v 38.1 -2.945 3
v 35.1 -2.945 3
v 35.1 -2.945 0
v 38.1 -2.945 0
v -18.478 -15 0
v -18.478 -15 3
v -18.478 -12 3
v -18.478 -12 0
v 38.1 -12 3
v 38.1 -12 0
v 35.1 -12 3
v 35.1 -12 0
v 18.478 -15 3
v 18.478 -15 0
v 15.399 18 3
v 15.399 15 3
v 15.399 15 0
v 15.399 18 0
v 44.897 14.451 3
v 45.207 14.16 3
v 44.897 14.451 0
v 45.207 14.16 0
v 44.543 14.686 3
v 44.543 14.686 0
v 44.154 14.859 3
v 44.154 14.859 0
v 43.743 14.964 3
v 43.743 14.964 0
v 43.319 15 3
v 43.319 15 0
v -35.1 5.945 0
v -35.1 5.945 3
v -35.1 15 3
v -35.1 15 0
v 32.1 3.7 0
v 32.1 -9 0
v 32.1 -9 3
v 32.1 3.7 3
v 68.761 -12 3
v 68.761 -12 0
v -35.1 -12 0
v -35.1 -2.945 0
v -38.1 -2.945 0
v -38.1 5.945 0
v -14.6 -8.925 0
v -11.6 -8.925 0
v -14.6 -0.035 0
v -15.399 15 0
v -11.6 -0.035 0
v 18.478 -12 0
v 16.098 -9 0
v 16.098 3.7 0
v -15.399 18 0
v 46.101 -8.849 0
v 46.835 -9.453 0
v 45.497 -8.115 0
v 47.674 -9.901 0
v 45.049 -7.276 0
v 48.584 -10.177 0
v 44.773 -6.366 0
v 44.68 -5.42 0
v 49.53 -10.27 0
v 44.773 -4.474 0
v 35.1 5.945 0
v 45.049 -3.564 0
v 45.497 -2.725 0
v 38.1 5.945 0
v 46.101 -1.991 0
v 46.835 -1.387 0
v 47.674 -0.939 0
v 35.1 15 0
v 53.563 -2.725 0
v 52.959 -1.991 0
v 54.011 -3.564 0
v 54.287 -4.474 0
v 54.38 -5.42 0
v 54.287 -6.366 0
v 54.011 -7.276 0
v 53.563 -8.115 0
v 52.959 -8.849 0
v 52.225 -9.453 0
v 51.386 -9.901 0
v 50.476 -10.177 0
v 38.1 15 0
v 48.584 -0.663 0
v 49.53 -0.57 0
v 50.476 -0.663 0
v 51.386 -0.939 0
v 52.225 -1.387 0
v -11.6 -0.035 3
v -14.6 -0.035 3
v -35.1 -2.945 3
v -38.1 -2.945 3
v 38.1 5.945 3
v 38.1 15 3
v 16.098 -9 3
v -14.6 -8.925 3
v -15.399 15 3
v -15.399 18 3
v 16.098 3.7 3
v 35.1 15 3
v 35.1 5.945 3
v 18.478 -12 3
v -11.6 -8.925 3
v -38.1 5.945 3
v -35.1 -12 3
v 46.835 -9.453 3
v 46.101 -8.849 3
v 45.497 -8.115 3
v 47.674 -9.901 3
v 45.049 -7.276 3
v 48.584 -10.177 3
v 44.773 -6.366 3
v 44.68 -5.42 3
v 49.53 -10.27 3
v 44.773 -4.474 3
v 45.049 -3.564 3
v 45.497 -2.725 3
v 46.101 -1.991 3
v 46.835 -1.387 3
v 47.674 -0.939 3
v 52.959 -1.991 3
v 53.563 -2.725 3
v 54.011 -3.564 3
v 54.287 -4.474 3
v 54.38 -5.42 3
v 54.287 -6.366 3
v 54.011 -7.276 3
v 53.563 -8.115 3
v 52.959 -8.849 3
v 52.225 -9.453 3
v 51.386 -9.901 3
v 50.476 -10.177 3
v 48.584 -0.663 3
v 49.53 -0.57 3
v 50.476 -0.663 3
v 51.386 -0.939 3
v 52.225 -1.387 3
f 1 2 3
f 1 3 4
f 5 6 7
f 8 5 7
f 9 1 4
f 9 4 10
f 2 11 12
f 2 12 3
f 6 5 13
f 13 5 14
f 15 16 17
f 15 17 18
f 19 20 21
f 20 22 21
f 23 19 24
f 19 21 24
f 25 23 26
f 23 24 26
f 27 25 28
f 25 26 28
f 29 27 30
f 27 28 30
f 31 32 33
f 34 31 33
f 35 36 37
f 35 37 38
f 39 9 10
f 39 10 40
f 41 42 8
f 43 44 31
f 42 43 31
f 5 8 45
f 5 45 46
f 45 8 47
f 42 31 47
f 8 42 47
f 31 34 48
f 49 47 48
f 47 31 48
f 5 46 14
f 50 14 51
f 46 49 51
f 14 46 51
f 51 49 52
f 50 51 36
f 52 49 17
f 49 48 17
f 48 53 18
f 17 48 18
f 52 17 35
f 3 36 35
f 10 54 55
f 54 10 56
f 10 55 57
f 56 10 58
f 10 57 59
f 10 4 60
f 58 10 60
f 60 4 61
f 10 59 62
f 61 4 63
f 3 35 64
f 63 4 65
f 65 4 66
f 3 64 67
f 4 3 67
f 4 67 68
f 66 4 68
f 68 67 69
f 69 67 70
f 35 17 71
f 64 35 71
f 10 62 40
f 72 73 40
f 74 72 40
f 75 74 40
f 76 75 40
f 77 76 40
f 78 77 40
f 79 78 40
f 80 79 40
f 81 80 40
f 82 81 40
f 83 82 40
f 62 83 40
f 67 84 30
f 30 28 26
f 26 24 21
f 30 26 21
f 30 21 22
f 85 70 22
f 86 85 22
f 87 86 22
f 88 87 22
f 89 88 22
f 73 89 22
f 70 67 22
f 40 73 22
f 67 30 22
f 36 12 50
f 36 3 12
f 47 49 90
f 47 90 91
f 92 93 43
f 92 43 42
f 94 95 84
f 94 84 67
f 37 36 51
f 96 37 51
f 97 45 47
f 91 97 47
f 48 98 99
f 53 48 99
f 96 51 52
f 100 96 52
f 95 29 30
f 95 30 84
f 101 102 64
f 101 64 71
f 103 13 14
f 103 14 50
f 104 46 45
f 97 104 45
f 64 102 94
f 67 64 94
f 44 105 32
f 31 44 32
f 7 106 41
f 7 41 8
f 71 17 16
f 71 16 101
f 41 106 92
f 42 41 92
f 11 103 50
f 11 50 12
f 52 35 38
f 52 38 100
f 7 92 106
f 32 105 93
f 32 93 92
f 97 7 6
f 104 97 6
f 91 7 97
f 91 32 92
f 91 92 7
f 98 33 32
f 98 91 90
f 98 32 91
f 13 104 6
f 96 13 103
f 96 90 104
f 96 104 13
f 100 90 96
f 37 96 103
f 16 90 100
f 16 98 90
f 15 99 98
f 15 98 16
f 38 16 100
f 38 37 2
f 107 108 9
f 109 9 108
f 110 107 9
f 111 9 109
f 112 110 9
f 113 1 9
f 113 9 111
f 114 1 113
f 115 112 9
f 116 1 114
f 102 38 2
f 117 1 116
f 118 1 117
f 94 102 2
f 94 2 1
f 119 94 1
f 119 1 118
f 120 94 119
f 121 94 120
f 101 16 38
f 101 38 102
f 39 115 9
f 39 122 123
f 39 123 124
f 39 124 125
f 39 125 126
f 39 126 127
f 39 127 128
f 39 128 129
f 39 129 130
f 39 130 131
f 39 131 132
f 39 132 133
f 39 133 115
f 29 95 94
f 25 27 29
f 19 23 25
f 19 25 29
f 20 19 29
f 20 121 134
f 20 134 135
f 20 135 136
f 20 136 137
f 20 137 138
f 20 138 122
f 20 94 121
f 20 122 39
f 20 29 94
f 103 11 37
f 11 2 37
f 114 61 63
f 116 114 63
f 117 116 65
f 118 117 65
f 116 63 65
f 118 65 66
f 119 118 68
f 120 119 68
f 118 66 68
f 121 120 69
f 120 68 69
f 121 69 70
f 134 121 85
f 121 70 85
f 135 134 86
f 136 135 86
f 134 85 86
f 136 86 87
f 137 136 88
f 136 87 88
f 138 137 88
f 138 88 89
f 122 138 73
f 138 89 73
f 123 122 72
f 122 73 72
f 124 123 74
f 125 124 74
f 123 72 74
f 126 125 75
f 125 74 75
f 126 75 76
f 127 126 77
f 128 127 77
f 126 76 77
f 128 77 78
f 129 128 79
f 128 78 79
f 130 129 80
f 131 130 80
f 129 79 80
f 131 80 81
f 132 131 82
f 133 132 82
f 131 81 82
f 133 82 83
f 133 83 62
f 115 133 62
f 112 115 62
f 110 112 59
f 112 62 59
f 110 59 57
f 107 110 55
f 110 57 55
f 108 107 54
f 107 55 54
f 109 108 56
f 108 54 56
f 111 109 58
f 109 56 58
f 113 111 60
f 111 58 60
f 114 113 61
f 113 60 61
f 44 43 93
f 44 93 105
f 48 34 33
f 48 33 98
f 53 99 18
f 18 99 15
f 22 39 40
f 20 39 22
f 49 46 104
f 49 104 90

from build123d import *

# Parameters (mm, degrees)
SKETCH_1_W          = 76.2
SKETCH_1_H          = 30
EXTRUDE_1_DEPTH     = 3
SKETCH_2_W          = 19.6215
SKETCH_2_H          = 3
CUT_EXTRUDE_1_DEPTH = 3
SKETCH_3_W          = 3
SKETCH_3_H          = 9.055
CUT_EXTRUDE_2_DEPTH = 3
EXTRUDE_2_DEPTH     = 3
SKETCH_6_W          = 30.7975
SKETCH_6_H          = 3
EXTRUDE_3_DEPTH     = 3
SKETCH_7_W          = 16.002
SKETCH_7_H          = 12.7
CUT_EXTRUDE_3_DEPTH = 3
SKETCH_8_R          = 4.85
CUT_EXTRUDE_4_DEPTH = 3
FILLET_1_R          = 2.54
SKETCH_9_W          = 3
SKETCH_9_H          = 8.89
CUT_EXTRUDE_5_DEPTH = 3


with BuildPart() as part:
    # 스케치1 → 보스-돌출1 (new body)
    with BuildSketch(Plane.XY):
        Rectangle(SKETCH_1_W, SKETCH_1_H)
    extrude(amount=EXTRUDE_1_DEPTH)

    # 스케치2 → 컷-돌출1 (cut)
    with BuildSketch(Plane.XY.offset(3)):
        with Locations((-28.28925, -13.5)):
            Rectangle(SKETCH_2_W, SKETCH_2_H)
        with Locations((28.28925, -13.5)):
            Rectangle(SKETCH_2_W, SKETCH_2_H)
    extrude(amount=-CUT_EXTRUDE_1_DEPTH, mode=Mode.SUBTRACT)

    # 스케치3 → 컷-돌출2 (cut)
    with BuildSketch(Plane.XY.offset(3)):
        with Locations((-36.6, 10.4725)):
            Rectangle(SKETCH_3_W, SKETCH_3_H)
        with Locations((-36.6, -7.4725)):
            Rectangle(SKETCH_3_W, SKETCH_3_H)
        with Locations((36.6, 10.4725)):
            Rectangle(SKETCH_3_W, SKETCH_3_H)
        with Locations((36.6, -7.4725)):
            Rectangle(SKETCH_3_W, SKETCH_3_H)
    extrude(amount=-CUT_EXTRUDE_2_DEPTH, mode=Mode.SUBTRACT)

    # 스케치5 → 보스-돌출2 (add)
    with BuildSketch(Plane.XY.offset(3)):
        Polygon((44.45, -12), (68.760909196, -12), (44.45, 15), (38.1, 15), (38.1, -12), align=None)
    extrude(amount=-EXTRUDE_2_DEPTH)

    # 스케치6 → 보스-돌출3 (add)
    with BuildSketch(Plane.XY.offset(3)):
        with Locations((0, 16.5)):
            Rectangle(SKETCH_6_W, SKETCH_6_H)
    extrude(amount=-EXTRUDE_3_DEPTH)

    # 스케치7 → 컷-돌출3 (cut)
    with BuildSketch(Plane(origin=(0, 0, 0), x_dir=(-1, 0, 0), z_dir=(0, 0, -1))):
        with Locations((-24.099, -2.65)):
            Rectangle(SKETCH_7_W, SKETCH_7_H)
    extrude(amount=-CUT_EXTRUDE_3_DEPTH, mode=Mode.SUBTRACT)

    # 스케치8 → 컷-돌출4 (cut)
    with BuildSketch(Plane(origin=(0, 0, 0), x_dir=(-1, 0, 0), z_dir=(0, 0, -1))):
        with Locations((-49.53, -5.42)):
            Circle(SKETCH_8_R)
    extrude(amount=-CUT_EXTRUDE_4_DEPTH, mode=Mode.SUBTRACT)

    # 필렛1
    fillet_1_edges = [part.edges().sort_by_distance(p)[0] for p in [
        (44.45, 15, 1.5),
    ]]
    fillet(fillet_1_edges, radius=FILLET_1_R)

    # 스케치9 → 컷-돌출5 (cut)
    with BuildSketch(Plane(origin=(0, 0, 0), x_dir=(-1, 0, 0), z_dir=(0, 0, -1))):
        with Locations((13.1, -4.4802)):
            Rectangle(SKETCH_9_W, SKETCH_9_H)
    extrude(amount=-CUT_EXTRUDE_5_DEPTH, mode=Mode.SUBTRACT)


solid = part.part
